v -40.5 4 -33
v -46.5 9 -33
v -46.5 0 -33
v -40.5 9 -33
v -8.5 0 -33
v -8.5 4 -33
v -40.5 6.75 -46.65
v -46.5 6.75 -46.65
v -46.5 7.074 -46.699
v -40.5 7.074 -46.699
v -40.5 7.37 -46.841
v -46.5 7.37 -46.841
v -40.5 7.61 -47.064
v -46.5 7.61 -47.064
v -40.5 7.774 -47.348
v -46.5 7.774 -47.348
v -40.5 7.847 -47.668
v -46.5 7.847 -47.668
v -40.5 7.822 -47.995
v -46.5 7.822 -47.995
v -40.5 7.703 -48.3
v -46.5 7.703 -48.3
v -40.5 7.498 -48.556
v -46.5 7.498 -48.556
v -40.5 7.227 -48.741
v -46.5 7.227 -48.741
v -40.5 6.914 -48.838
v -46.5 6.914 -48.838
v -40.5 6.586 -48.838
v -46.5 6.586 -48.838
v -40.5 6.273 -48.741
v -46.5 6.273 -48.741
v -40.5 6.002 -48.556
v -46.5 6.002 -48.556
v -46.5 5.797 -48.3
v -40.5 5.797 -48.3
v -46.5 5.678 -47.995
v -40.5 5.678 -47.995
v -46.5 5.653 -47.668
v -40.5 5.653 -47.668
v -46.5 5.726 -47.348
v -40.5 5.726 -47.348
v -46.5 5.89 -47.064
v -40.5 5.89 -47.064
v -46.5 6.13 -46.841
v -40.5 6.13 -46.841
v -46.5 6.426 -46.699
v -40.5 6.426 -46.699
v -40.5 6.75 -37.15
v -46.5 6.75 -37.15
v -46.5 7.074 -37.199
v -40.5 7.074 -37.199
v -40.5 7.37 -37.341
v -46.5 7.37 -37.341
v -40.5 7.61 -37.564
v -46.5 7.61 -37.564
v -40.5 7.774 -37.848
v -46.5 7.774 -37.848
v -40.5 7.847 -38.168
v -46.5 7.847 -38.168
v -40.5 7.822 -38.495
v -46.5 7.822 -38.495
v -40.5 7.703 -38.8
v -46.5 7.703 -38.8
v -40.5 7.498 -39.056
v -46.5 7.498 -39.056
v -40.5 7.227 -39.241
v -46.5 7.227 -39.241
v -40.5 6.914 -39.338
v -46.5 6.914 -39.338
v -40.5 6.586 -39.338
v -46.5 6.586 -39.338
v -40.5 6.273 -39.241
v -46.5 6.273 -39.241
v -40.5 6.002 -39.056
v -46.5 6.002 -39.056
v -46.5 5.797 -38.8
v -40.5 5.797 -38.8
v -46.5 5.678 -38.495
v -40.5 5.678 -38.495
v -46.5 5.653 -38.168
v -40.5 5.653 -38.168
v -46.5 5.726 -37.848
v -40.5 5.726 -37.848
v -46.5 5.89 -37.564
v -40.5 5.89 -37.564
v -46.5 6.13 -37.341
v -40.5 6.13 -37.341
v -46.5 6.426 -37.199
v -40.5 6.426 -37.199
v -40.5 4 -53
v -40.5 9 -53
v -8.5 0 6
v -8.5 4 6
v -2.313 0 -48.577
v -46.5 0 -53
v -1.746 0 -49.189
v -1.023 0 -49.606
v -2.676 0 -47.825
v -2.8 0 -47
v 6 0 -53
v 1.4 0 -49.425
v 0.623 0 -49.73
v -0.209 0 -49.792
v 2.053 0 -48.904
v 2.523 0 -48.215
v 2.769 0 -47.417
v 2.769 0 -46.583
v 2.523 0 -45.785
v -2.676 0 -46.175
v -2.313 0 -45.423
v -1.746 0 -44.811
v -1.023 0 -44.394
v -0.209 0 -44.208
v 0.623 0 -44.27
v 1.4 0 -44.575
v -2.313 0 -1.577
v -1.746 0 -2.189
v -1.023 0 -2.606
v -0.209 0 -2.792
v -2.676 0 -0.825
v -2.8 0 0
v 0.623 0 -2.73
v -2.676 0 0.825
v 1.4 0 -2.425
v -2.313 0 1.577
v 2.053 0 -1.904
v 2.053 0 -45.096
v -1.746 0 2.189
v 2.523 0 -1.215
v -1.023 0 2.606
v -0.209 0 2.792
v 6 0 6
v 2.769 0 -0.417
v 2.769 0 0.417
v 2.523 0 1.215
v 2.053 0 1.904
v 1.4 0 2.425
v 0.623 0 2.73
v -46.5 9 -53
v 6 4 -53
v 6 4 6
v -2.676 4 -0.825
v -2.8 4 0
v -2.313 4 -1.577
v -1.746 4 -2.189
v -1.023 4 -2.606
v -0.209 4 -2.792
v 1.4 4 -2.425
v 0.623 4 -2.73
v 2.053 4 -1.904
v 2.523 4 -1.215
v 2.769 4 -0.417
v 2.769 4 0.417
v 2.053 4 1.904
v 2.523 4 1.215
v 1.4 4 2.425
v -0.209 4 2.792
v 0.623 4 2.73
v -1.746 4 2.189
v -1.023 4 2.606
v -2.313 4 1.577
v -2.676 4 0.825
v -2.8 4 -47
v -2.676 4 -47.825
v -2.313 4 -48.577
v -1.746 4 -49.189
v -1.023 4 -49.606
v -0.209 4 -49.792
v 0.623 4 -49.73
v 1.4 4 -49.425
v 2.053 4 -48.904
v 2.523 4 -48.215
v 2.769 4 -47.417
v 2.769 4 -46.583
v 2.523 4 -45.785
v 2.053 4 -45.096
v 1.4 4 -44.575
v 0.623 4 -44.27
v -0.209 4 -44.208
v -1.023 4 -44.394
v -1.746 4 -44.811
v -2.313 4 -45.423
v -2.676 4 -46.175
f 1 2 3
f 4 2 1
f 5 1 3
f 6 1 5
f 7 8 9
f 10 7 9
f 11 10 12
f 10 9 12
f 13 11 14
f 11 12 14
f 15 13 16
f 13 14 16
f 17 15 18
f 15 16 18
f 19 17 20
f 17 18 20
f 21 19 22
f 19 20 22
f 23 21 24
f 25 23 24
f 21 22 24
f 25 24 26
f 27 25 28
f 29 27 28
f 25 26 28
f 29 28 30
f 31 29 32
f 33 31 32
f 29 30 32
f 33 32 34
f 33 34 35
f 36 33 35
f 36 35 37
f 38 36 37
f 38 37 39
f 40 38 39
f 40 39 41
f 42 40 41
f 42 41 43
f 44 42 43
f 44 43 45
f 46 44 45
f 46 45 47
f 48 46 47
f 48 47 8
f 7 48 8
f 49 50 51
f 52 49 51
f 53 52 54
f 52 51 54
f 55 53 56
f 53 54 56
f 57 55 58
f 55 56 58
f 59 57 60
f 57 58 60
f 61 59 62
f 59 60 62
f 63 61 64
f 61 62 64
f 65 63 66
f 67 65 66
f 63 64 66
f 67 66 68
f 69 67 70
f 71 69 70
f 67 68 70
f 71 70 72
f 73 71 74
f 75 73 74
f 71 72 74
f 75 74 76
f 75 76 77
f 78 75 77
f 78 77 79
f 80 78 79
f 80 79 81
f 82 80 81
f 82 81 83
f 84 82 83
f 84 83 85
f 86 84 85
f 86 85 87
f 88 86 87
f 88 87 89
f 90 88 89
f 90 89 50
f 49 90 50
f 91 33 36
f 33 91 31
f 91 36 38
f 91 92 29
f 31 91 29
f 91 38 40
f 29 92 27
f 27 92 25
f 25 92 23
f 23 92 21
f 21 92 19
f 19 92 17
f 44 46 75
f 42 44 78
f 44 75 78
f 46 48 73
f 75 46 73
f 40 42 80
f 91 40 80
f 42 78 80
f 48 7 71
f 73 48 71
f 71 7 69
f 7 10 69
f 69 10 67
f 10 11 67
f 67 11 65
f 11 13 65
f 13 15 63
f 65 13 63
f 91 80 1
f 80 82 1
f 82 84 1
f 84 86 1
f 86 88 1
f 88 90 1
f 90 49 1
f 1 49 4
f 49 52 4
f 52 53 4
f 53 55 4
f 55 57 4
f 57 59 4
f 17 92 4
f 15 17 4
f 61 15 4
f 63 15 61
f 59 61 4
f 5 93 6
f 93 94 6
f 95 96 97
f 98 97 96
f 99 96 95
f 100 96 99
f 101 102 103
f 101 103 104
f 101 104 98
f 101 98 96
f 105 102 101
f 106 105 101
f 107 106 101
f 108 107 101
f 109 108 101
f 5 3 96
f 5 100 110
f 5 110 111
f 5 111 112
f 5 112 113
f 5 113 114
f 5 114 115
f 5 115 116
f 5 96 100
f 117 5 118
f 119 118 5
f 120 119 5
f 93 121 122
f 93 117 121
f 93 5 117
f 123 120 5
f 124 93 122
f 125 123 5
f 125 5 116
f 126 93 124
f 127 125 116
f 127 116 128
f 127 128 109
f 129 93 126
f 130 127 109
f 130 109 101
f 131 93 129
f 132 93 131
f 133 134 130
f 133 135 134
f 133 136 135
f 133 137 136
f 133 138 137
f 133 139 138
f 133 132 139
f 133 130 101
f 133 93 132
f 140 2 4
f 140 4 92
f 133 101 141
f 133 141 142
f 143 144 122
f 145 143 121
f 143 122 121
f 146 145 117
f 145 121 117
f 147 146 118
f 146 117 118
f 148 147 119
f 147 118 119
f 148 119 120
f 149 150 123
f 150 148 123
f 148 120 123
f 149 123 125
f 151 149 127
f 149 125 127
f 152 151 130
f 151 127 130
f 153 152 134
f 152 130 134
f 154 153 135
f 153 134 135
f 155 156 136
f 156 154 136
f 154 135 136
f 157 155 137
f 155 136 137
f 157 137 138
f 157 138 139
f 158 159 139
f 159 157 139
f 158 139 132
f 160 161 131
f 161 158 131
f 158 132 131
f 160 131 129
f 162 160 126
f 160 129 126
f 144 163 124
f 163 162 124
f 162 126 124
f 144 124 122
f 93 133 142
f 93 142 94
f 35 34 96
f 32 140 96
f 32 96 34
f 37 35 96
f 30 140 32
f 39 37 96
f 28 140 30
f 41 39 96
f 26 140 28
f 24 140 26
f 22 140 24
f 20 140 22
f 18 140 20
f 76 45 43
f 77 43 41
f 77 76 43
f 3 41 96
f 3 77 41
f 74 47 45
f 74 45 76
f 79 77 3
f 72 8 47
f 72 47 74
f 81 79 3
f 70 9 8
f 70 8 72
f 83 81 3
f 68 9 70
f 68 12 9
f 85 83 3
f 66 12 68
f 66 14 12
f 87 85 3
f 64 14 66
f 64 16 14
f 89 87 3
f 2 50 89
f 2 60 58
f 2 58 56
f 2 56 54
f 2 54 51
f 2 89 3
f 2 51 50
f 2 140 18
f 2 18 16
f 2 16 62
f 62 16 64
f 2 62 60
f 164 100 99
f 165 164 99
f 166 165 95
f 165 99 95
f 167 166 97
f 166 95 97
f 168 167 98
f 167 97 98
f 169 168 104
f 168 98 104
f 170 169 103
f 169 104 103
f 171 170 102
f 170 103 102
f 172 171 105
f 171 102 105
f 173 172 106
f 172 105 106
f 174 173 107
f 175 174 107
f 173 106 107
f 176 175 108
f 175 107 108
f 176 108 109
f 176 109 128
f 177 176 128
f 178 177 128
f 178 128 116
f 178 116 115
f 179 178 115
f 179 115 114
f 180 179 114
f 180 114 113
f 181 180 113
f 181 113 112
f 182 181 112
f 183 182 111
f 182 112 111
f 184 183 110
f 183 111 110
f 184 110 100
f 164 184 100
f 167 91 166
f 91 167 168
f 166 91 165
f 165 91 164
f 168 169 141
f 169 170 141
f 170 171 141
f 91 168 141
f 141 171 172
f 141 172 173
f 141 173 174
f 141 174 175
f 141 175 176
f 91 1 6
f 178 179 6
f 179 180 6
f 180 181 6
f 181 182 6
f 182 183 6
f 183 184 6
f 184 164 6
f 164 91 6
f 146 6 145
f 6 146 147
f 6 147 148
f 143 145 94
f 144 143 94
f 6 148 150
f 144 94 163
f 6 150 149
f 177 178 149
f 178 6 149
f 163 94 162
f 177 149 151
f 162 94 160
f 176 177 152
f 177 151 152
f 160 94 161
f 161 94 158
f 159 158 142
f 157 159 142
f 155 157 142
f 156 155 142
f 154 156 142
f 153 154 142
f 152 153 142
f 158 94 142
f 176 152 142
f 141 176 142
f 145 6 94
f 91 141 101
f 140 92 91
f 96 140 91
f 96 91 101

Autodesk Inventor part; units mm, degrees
ref_plane "YZ Plane" through (0, 0, 0) normal (1, 0, 0) x (0, 1, 0)
ref_plane "XZ Plane" through (0, 0, 0) normal (0, 1, 0) x (-1, 0, 0)
ref_plane "XY Plane" through (0, 0, 0) normal (0, 0, 1) x (1, 0, 0)
sketch "Sketch1" plane through (0, 0, 0) normal (0, 1, 0) x (-1, 0, 0)
  line L0 (0, 0) -> (40.5, 0)
  line L1 (40.5, 0) -> (40.5, -47)
  line L2 (40.5, -47) -> (0, -47)
  line L3 (0, -47) -> (0, 0)
  circle A0 centre (0, 0) radius 2.8
  circle A1 centre (0, -47) radius 2.8
  line L4 (0, 0) -> (-6, 0)
  line L5 (-6, 0) -> (-6, 6)
  line L6 (0, -47) -> (-6, -47)
  line L7 (-6, -47) -> (-6, -53)
  line L8 (-6, -53) -> (40.5, -53)
  line L9 (40.5, -53) -> (-6, -53)
  line L10 (-6, -53) -> (-6, 6)
  line L11 (-6, 6) -> (40.5, 6)
  line L12 (40.5, 6) -> (40.5, -53)
  line L13 (40.5, 6) -> (46.5, 6)
  line L14 (46.5, 6) -> (46.5, -53)
  line L15 (46.5, -53) -> (40.5, -53)
  line L16 (40.5, -53) -> (40.5, 6)
  dimension "d0" = 40.5
  dimension "d1" = 47
  dimension "d2" = 5.6
  dimension "d3" = 5.6
  dimension "d4" = 6
  dimension "d5" = 6
  dimension "d6" = 6
  dimension "d7" = 6
  dimension "d8" = 6
extrude "Extrusion1" add sketch "Sketch1" along normal blind 4 contours A0 L4 L5 L11 L12 L0 | L0 L1 L2 A1 L3 A0 | L3 A1 L6 L10 L4 A0 | L12 L13 L14 L15 L1 | L12 L8 L7 L6 A1 L2
sketch "Sketch3" plane through (-46.5, 0, -53) normal (-1, 0, 0) x (0, 0, 1)
  line L0 (0, 0) -> (0, 4) projected
  line L1 (0, 4) -> (20, 4)
  line L2 (20, 4) -> (20, 9)
  line L3 (20, 9) -> (0, 9)
  line L4 (0, 9) -> (0, 4)
  point P0 (53, 0)
  dimension "d11" = 20
  dimension "d12" = 5
extrude "Extrusion2" add sketch "Sketch3" against normal blind 6
sketch "Sketch4" plane through (0, 4, 0) normal (0, 1, 0) x (1, 0, 0)
  line L0 (-46.5, -6) -> (6, -6) projected
  line L1 (-46.5, -6) -> (-8.5, -6)
  line L2 (-8.5, -6) -> (-8.5, 36)
  line L3 (-8.5, 36) -> (-46.5, 36)
  line L4 (-46.5, 36) -> (-46.5, -6)
  point P0 (0, 0)
  dimension "d15" = 38
  dimension "d16" = 42
extrude "Extrusion3" cut sketch "Sketch4" against normal blind 6
sketch "Sketch5" plane through (-46.5, 9, -53) normal (-1, 0, 0) x (0, 0, 1)
  line L0 (20, 0) -> (0, 0) projected
  line L1 (10, 0) -> (5.25, 0)
  line L2 (5.25, 0) -> (5.25, 2.25)
  line L3 (5.25, 0) -> (5.25, -2.25)
  line L4 (5.25, -2.25) -> (14.75, -2.25)
  circle A0 centre (5.25, -2.25) radius 1.1
  circle A1 centre (14.75, -2.25) radius 1.1
  point P0 (53, -9)
  dimension "d19" = 4.75
  dimension "d20" = 2.25
  dimension "d21" = 90
  dimension "d22" = 2.25
  dimension "d23" = 9.5
  dimension "d24" = 2.2
  dimension "d25" = 2.2
extrude "Extrusion4" cut sketch "Sketch5" against normal blind 6
sketch "Sketch6" plane through (0, 4, 0) normal (0, -1, 0) x (1, 0, 0)
  line L0 (-46.5, -36) -> (-46.5, -33) projected
  line L1 (-8.5, -36) -> (-8.5, 6) projected
  line L2 (-46.5, -33) -> (-8.5, -33)
  line L3 (-8.5, -33) -> (-8.5, -36)
  line L4 (-8.5, -36) -> (-46.5, -36)
  line L5 (-46.5, -36) -> (-46.5, -33)
  point P0 (0, 0)
extrude "Extrusion5" add sketch "Sketch6" along normal blind 4
properties part number "limit_switch_lower_mount"
